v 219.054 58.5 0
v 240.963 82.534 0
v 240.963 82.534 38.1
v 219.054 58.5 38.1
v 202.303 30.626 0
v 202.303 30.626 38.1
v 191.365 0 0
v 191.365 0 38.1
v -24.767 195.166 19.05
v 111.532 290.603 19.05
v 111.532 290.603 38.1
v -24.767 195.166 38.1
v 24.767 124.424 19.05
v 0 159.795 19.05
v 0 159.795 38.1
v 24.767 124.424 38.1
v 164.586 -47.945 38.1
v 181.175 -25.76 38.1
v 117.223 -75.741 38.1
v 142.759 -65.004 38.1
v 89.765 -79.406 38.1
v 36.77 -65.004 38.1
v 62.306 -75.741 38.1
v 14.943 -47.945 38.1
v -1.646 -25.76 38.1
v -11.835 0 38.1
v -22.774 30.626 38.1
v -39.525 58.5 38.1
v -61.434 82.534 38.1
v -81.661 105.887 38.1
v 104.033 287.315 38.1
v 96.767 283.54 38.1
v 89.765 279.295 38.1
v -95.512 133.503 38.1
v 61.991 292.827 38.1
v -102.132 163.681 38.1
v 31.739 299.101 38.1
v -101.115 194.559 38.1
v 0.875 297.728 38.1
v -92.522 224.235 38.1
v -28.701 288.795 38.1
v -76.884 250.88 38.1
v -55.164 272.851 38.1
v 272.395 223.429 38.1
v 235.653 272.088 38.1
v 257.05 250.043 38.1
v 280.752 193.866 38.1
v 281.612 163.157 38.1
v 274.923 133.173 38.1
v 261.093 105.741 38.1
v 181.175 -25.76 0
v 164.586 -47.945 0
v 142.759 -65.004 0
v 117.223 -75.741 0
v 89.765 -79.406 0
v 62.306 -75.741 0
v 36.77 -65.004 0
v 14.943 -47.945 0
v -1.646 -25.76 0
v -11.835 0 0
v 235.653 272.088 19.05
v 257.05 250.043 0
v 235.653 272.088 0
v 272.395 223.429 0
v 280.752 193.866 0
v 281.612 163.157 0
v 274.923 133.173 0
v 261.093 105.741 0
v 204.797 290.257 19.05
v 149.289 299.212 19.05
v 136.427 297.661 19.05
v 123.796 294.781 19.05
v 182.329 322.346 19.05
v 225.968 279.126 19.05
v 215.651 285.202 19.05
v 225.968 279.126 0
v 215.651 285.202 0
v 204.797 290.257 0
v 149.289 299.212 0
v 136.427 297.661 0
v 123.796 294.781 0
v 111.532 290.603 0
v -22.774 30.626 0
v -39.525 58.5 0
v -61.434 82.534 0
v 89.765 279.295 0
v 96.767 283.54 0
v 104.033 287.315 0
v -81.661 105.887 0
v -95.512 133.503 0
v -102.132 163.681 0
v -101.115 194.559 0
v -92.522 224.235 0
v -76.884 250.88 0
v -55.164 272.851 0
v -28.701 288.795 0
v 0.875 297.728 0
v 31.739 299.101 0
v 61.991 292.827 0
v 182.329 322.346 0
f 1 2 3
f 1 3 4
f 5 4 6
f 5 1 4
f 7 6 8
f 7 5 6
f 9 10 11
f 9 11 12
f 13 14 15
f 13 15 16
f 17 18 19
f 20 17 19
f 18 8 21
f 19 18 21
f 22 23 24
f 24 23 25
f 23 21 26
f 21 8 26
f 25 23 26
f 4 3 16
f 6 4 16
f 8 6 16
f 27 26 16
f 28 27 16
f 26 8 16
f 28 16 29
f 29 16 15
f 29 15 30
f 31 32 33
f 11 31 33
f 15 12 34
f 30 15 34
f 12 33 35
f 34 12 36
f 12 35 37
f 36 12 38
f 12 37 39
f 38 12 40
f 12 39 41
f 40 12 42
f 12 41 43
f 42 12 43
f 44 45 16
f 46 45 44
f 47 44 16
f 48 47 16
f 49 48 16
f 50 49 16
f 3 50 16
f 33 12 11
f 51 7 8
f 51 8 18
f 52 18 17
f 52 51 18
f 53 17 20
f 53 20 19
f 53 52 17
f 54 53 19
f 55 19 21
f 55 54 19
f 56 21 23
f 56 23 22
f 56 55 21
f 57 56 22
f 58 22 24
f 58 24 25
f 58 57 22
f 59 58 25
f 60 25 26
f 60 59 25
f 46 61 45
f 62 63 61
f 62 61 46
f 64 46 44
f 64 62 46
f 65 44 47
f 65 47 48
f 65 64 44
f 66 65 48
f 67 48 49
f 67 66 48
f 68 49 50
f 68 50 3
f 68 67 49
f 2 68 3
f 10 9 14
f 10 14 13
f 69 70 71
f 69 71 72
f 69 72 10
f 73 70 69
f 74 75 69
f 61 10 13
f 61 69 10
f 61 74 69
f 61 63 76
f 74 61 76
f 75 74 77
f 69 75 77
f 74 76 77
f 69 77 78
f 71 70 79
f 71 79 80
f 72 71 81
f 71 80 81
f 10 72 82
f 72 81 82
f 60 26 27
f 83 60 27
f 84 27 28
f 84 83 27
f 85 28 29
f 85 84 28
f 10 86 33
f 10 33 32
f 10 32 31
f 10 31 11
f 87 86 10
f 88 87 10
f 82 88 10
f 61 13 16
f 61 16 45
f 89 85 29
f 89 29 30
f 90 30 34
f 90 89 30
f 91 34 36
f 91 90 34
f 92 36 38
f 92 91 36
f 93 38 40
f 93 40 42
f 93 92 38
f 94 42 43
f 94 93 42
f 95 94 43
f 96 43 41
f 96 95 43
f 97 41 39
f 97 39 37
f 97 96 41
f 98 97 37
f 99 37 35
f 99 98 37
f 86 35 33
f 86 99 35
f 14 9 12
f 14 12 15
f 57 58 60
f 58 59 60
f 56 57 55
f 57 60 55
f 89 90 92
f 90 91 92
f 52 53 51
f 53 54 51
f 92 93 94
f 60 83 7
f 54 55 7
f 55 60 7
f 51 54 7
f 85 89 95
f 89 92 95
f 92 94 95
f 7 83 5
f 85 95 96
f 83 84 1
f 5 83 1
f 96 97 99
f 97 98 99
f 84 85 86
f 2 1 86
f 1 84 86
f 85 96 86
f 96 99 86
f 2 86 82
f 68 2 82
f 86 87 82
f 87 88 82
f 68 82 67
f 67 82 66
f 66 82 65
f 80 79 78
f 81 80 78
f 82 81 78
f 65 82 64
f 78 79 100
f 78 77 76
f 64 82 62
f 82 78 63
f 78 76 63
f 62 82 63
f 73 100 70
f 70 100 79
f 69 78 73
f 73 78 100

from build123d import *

# Parameters (mm, degrees)
BOSS_EXTRUDE1_DEPTH = 38.1
BOSS_EXTRUDE2_DEPTH = 19.05
BOSS_EXTRUDE3_DEPTH = 19.05


with BuildPart() as part:
    # Sketch2 → Boss-Extrude1 (new body)
    with BuildSketch(Plane.XY):
        with BuildLine():
            Line((0, 159.7945402), (24.767030522, 124.423554927))
            Line((24.767030522, 124.423554927), (235.653251342, 272.08767645))
            ThreePointArc((235.653251342, 272.08767645), (282.133094114, 178.538387025), (240.963304039, 82.533732339))
            ThreePointArc((240.963304039, 82.533732339), (209.988023007, 44.978276319), (191.364517126, 0))
            ThreePointArc((191.364517126, 0), (89.764517126, -79.406163555), (-11.835482874, 0))
            ThreePointArc((-11.835482874, 0), (-30.458988755, 44.978276319), (-61.434269787, 82.533732339))
            ThreePointArc((-61.434269787, 82.533732339), (-76.883813046, 250.879864381), (89.764517126, 279.295399058))
            ThreePointArc((89.764517126, 279.295399058), (100.369013371, 285.48693454), (111.532091006, 290.603197817))
            Line((111.532091006, 290.603197817), (-24.767030522, 195.165525472))
            Line((-24.767030522, 195.165525472), (0, 159.7945402))
        make_face()
    extrude(amount=BOSS_EXTRUDE1_DEPTH)



with BuildPart() as body_2:
    # Sketch3 → Boss-Extrude2 (new body)
    with BuildSketch(Plane(origin=(0, 0, 0), x_dir=(-1, 0, 0), z_dir=(0, 0, -1))):
        with BuildLine():
            Line((24.767030522, 195.165525472), (-24.767030522, 124.423554927))
            Line((-24.767030522, 124.423554927), (-235.653251342, 272.08767645))
            ThreePointArc((-235.653251342, 272.08767645), (-176.097486655, 298.136787359), (-111.532091006, 290.603197817))
            Line((-111.532091006, 290.603197817), (24.767030522, 195.165525472))
        make_face()
    extrude(amount=-BOSS_EXTRUDE2_DEPTH)


with BuildPart() as part_1:
    add(part.part)

    add(body_2.part)  # Boss-Extrude3 merges body 2
    # Sketch4 → Boss-Extrude3 (add)
    with BuildSketch(Plane(origin=(0, 0, 0), x_dir=(-1, 0, 0), z_dir=(0, 0, -1))):
        Polygon((-152.689068197, 231.824942879), (-215.108453971, 275.531467329), (-182.328560634, 322.34600666), (-119.909174859, 278.63948221), align=None)
    extrude(amount=-BOSS_EXTRUDE3_DEPTH)


solid = part_1.part
